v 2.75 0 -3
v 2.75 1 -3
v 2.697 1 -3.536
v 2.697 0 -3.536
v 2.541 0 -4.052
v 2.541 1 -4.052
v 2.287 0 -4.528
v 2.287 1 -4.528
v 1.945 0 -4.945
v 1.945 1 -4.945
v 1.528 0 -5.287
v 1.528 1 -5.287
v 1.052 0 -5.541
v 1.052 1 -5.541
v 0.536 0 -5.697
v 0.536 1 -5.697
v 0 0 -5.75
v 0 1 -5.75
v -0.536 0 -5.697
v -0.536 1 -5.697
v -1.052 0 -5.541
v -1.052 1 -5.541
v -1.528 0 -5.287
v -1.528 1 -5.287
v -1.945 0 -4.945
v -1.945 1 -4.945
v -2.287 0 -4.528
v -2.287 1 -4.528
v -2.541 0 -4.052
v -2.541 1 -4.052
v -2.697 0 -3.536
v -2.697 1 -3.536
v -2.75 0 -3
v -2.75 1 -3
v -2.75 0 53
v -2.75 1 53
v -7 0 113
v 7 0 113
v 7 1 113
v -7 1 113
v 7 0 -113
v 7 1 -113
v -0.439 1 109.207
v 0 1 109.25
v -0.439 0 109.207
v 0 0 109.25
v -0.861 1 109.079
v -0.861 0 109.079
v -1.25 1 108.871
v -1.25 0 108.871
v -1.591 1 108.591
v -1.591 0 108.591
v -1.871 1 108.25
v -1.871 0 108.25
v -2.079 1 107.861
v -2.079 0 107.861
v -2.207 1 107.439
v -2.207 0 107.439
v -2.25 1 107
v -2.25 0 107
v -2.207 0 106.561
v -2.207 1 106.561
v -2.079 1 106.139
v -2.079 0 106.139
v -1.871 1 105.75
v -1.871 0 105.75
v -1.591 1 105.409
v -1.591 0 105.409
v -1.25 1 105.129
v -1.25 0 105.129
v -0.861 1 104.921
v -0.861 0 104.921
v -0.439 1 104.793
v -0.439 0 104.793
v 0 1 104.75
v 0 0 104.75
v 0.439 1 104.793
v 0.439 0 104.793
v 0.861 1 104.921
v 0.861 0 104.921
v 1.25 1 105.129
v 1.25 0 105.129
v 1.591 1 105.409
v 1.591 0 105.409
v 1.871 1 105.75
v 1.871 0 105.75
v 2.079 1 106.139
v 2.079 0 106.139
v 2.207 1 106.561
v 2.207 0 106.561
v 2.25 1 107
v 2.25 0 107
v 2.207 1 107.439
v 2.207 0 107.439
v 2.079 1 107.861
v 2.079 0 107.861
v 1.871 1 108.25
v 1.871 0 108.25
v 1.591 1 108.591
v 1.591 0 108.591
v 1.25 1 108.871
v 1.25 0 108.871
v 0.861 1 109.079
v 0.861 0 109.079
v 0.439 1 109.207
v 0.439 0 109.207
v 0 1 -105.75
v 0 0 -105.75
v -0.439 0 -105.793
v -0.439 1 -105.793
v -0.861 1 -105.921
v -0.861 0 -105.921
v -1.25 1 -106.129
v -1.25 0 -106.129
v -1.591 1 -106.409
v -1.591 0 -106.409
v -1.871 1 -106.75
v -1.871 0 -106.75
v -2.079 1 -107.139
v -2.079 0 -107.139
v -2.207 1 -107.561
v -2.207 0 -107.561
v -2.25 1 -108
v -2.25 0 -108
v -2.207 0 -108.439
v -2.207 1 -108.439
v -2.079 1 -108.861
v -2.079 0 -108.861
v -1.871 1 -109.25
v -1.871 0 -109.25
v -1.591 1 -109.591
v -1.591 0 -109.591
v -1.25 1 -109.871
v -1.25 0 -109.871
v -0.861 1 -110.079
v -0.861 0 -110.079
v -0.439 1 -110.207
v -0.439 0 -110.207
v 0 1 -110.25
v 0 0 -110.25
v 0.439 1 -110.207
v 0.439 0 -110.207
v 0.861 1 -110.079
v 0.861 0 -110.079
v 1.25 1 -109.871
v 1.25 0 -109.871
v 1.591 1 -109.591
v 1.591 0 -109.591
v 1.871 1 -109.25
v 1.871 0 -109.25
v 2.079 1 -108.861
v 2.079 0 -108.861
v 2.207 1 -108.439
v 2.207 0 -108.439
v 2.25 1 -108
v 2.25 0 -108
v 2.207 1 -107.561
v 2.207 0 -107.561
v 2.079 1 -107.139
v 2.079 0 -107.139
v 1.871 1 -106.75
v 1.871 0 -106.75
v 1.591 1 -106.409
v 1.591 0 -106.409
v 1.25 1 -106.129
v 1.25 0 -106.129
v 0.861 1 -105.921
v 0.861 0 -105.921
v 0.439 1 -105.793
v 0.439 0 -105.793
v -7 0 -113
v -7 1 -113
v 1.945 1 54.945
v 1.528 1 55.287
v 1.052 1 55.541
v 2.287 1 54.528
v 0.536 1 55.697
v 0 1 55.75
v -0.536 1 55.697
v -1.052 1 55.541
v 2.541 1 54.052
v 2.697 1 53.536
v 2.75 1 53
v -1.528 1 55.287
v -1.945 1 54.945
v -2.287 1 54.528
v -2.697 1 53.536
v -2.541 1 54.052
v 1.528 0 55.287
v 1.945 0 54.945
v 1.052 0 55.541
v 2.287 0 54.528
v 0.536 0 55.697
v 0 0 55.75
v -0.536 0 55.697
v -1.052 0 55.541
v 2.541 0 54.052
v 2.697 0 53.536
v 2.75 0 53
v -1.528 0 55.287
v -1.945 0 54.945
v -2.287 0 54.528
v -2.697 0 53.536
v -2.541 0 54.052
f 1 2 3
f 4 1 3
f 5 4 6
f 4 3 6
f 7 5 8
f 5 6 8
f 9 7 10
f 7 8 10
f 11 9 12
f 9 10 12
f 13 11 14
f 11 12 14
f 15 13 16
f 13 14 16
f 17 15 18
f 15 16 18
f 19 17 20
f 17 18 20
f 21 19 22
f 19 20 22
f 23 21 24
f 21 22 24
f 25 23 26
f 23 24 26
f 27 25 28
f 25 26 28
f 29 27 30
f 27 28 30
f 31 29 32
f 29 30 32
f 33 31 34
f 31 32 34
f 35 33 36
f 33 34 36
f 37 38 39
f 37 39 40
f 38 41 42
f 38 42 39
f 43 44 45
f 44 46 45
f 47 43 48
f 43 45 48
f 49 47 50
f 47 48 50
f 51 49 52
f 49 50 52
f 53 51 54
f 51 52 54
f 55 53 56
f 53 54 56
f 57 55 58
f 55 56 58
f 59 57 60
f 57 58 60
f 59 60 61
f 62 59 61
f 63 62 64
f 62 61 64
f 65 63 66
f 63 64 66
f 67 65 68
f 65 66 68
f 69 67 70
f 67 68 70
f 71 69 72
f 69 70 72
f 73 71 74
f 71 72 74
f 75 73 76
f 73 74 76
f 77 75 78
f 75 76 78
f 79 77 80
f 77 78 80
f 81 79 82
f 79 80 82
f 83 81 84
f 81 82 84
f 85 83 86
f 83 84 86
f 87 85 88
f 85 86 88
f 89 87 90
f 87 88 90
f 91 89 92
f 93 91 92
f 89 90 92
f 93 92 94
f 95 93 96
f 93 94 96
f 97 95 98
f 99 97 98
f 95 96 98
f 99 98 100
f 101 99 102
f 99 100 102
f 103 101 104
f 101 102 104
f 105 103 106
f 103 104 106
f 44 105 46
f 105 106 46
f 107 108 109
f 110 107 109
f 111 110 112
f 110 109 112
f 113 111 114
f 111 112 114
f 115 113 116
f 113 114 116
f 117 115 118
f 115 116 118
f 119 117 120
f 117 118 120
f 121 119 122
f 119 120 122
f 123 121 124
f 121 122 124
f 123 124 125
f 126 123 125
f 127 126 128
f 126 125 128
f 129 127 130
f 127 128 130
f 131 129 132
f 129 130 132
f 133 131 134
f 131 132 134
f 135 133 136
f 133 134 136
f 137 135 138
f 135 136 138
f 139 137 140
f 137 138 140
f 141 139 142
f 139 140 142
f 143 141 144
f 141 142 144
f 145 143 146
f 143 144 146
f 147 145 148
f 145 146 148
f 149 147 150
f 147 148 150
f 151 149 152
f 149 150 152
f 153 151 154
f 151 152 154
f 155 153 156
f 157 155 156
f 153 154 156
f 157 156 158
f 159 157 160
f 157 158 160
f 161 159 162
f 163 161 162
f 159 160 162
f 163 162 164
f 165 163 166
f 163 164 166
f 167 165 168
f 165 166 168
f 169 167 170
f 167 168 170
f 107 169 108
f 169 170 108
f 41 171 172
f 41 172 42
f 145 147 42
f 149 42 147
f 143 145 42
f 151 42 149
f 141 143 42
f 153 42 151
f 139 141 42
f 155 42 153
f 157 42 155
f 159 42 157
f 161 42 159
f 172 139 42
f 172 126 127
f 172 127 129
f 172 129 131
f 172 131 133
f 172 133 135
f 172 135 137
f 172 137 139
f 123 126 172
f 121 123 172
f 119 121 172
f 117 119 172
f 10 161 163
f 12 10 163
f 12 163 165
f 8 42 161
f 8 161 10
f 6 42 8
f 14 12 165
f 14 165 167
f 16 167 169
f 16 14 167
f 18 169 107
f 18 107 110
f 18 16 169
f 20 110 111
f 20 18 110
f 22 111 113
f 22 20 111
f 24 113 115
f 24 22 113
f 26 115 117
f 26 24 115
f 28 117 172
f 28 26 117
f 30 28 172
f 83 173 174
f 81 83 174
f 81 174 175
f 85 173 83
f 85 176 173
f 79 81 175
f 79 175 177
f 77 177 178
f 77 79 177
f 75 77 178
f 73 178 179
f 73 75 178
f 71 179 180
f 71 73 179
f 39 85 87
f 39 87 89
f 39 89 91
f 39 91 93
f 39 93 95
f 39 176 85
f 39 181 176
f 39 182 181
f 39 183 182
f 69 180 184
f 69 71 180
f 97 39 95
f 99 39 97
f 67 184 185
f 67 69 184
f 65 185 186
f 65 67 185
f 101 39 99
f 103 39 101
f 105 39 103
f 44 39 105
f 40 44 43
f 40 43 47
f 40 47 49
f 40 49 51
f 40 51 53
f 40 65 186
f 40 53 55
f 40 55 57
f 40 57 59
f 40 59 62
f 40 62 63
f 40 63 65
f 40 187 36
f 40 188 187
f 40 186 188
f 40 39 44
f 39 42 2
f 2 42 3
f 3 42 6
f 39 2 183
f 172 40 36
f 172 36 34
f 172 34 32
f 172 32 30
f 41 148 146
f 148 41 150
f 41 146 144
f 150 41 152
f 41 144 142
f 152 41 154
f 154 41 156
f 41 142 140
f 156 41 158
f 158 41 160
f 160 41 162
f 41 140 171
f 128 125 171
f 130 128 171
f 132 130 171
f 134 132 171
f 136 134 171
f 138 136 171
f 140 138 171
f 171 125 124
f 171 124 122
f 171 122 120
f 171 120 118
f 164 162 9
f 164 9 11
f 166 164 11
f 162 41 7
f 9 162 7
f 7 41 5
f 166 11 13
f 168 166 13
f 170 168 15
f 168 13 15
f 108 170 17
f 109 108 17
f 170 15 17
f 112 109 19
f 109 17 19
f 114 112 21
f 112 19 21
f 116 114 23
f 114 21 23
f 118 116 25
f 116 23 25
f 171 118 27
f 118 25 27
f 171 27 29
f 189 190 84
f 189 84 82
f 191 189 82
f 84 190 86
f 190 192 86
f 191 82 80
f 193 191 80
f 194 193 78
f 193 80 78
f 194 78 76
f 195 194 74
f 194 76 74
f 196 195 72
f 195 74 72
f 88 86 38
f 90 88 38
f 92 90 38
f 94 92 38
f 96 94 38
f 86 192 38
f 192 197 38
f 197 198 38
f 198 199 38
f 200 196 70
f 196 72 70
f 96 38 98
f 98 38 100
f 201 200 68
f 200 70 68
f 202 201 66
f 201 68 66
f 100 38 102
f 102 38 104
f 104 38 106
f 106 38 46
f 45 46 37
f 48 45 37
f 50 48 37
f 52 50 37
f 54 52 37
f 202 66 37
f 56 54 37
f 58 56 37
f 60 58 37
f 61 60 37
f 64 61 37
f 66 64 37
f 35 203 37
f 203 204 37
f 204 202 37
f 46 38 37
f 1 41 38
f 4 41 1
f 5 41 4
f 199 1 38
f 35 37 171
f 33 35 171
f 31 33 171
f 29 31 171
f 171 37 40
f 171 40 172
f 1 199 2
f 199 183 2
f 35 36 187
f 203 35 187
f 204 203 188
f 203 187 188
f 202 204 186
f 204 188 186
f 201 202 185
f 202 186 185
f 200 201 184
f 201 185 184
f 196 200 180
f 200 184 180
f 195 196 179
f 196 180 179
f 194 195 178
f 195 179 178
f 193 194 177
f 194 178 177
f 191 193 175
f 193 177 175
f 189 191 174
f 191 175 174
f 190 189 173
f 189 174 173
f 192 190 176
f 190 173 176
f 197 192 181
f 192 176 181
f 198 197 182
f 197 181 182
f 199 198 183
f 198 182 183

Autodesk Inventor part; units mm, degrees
ref_plane "YZ Plane" through (0, 0, 0) normal (1, 0, 0) x (0, 1, 0)
ref_plane "XZ Plane" through (0, 0, 0) normal (0, 1, 0) x (-1, 0, 0)
ref_plane "XY Plane" through (0, 0, 0) normal (0, 0, 1) x (1, 0, 0)
sketch "Esquisse2" plane through (0, 0, 0) normal (0, 1, 0) x (-1, 0, 0)
  line L0 (-7, 113) -> (7, 113)
  line L1 (7, 113) -> (7, -113)
  line L2 (7, -113) -> (-7, -113)
  line L3 (-7, -113) -> (-7, 113)
  line L4 (-7, 113) -> (7, -113) construction
  line L5 (7, 113) -> (-7, -113) construction
  point P0 (0, 0)
  dimension "d0" = 226
  dimension "d1" = 14
extrude "Extrusion1" add sketch "Esquisse2" along normal blind 1
sketch "Esquisse3" plane through (0, 1, 0) normal (0, 1, 0) x (1, 0, 0)
  line L0 (7, 113) -> (-7, 113) projected
  line L1 (-7, -113) -> (7, -113) projected
  point P0 (0, 0)
  point P1 (0, -107)
  point P2 (0, 108)
  dimension "d4" = 5
  dimension "d14" = 215
hole "Perçage1" at (0, 1, 107) at (0, 1, -108) direction (0, -1, 0) diameter 4.5 end through all clearance for "Vis d'assemblage à six pans creux ISO 4762" size "M4" standard "ISO"
sketch "Esquisse4" plane through (0, 1, 0) normal (0, 1, 0) x (1, 0, 0)
  line L0 (0, 3) -> (0, -53) construction
  line L1 (-2.75, 3) -> (-2.75, -53)
  line L2 (2.75, -53) -> (2.75, 3)
  arc A0 (2.75, 3) -> (-2.75, 3) centre (0, 3) ccw
  arc A1 (-2.75, -53) -> (2.75, -53) centre (0, -53) ccw
  line L3 (7, 113) -> (-7, 113) projected
  line L4 (-7, -113) -> (7, -113) projected
  point P0 (0, 0)
  point P1 (0, -25)
  dimension "d15" = 56
  dimension "d17" = 5.5
  dimension "d21" = 60
extrude "Extrusion2" cut sketch "Esquisse4" against normal up to surface (1 mm away)
properties part number "support_lateral" material "Aluminium 6061"
